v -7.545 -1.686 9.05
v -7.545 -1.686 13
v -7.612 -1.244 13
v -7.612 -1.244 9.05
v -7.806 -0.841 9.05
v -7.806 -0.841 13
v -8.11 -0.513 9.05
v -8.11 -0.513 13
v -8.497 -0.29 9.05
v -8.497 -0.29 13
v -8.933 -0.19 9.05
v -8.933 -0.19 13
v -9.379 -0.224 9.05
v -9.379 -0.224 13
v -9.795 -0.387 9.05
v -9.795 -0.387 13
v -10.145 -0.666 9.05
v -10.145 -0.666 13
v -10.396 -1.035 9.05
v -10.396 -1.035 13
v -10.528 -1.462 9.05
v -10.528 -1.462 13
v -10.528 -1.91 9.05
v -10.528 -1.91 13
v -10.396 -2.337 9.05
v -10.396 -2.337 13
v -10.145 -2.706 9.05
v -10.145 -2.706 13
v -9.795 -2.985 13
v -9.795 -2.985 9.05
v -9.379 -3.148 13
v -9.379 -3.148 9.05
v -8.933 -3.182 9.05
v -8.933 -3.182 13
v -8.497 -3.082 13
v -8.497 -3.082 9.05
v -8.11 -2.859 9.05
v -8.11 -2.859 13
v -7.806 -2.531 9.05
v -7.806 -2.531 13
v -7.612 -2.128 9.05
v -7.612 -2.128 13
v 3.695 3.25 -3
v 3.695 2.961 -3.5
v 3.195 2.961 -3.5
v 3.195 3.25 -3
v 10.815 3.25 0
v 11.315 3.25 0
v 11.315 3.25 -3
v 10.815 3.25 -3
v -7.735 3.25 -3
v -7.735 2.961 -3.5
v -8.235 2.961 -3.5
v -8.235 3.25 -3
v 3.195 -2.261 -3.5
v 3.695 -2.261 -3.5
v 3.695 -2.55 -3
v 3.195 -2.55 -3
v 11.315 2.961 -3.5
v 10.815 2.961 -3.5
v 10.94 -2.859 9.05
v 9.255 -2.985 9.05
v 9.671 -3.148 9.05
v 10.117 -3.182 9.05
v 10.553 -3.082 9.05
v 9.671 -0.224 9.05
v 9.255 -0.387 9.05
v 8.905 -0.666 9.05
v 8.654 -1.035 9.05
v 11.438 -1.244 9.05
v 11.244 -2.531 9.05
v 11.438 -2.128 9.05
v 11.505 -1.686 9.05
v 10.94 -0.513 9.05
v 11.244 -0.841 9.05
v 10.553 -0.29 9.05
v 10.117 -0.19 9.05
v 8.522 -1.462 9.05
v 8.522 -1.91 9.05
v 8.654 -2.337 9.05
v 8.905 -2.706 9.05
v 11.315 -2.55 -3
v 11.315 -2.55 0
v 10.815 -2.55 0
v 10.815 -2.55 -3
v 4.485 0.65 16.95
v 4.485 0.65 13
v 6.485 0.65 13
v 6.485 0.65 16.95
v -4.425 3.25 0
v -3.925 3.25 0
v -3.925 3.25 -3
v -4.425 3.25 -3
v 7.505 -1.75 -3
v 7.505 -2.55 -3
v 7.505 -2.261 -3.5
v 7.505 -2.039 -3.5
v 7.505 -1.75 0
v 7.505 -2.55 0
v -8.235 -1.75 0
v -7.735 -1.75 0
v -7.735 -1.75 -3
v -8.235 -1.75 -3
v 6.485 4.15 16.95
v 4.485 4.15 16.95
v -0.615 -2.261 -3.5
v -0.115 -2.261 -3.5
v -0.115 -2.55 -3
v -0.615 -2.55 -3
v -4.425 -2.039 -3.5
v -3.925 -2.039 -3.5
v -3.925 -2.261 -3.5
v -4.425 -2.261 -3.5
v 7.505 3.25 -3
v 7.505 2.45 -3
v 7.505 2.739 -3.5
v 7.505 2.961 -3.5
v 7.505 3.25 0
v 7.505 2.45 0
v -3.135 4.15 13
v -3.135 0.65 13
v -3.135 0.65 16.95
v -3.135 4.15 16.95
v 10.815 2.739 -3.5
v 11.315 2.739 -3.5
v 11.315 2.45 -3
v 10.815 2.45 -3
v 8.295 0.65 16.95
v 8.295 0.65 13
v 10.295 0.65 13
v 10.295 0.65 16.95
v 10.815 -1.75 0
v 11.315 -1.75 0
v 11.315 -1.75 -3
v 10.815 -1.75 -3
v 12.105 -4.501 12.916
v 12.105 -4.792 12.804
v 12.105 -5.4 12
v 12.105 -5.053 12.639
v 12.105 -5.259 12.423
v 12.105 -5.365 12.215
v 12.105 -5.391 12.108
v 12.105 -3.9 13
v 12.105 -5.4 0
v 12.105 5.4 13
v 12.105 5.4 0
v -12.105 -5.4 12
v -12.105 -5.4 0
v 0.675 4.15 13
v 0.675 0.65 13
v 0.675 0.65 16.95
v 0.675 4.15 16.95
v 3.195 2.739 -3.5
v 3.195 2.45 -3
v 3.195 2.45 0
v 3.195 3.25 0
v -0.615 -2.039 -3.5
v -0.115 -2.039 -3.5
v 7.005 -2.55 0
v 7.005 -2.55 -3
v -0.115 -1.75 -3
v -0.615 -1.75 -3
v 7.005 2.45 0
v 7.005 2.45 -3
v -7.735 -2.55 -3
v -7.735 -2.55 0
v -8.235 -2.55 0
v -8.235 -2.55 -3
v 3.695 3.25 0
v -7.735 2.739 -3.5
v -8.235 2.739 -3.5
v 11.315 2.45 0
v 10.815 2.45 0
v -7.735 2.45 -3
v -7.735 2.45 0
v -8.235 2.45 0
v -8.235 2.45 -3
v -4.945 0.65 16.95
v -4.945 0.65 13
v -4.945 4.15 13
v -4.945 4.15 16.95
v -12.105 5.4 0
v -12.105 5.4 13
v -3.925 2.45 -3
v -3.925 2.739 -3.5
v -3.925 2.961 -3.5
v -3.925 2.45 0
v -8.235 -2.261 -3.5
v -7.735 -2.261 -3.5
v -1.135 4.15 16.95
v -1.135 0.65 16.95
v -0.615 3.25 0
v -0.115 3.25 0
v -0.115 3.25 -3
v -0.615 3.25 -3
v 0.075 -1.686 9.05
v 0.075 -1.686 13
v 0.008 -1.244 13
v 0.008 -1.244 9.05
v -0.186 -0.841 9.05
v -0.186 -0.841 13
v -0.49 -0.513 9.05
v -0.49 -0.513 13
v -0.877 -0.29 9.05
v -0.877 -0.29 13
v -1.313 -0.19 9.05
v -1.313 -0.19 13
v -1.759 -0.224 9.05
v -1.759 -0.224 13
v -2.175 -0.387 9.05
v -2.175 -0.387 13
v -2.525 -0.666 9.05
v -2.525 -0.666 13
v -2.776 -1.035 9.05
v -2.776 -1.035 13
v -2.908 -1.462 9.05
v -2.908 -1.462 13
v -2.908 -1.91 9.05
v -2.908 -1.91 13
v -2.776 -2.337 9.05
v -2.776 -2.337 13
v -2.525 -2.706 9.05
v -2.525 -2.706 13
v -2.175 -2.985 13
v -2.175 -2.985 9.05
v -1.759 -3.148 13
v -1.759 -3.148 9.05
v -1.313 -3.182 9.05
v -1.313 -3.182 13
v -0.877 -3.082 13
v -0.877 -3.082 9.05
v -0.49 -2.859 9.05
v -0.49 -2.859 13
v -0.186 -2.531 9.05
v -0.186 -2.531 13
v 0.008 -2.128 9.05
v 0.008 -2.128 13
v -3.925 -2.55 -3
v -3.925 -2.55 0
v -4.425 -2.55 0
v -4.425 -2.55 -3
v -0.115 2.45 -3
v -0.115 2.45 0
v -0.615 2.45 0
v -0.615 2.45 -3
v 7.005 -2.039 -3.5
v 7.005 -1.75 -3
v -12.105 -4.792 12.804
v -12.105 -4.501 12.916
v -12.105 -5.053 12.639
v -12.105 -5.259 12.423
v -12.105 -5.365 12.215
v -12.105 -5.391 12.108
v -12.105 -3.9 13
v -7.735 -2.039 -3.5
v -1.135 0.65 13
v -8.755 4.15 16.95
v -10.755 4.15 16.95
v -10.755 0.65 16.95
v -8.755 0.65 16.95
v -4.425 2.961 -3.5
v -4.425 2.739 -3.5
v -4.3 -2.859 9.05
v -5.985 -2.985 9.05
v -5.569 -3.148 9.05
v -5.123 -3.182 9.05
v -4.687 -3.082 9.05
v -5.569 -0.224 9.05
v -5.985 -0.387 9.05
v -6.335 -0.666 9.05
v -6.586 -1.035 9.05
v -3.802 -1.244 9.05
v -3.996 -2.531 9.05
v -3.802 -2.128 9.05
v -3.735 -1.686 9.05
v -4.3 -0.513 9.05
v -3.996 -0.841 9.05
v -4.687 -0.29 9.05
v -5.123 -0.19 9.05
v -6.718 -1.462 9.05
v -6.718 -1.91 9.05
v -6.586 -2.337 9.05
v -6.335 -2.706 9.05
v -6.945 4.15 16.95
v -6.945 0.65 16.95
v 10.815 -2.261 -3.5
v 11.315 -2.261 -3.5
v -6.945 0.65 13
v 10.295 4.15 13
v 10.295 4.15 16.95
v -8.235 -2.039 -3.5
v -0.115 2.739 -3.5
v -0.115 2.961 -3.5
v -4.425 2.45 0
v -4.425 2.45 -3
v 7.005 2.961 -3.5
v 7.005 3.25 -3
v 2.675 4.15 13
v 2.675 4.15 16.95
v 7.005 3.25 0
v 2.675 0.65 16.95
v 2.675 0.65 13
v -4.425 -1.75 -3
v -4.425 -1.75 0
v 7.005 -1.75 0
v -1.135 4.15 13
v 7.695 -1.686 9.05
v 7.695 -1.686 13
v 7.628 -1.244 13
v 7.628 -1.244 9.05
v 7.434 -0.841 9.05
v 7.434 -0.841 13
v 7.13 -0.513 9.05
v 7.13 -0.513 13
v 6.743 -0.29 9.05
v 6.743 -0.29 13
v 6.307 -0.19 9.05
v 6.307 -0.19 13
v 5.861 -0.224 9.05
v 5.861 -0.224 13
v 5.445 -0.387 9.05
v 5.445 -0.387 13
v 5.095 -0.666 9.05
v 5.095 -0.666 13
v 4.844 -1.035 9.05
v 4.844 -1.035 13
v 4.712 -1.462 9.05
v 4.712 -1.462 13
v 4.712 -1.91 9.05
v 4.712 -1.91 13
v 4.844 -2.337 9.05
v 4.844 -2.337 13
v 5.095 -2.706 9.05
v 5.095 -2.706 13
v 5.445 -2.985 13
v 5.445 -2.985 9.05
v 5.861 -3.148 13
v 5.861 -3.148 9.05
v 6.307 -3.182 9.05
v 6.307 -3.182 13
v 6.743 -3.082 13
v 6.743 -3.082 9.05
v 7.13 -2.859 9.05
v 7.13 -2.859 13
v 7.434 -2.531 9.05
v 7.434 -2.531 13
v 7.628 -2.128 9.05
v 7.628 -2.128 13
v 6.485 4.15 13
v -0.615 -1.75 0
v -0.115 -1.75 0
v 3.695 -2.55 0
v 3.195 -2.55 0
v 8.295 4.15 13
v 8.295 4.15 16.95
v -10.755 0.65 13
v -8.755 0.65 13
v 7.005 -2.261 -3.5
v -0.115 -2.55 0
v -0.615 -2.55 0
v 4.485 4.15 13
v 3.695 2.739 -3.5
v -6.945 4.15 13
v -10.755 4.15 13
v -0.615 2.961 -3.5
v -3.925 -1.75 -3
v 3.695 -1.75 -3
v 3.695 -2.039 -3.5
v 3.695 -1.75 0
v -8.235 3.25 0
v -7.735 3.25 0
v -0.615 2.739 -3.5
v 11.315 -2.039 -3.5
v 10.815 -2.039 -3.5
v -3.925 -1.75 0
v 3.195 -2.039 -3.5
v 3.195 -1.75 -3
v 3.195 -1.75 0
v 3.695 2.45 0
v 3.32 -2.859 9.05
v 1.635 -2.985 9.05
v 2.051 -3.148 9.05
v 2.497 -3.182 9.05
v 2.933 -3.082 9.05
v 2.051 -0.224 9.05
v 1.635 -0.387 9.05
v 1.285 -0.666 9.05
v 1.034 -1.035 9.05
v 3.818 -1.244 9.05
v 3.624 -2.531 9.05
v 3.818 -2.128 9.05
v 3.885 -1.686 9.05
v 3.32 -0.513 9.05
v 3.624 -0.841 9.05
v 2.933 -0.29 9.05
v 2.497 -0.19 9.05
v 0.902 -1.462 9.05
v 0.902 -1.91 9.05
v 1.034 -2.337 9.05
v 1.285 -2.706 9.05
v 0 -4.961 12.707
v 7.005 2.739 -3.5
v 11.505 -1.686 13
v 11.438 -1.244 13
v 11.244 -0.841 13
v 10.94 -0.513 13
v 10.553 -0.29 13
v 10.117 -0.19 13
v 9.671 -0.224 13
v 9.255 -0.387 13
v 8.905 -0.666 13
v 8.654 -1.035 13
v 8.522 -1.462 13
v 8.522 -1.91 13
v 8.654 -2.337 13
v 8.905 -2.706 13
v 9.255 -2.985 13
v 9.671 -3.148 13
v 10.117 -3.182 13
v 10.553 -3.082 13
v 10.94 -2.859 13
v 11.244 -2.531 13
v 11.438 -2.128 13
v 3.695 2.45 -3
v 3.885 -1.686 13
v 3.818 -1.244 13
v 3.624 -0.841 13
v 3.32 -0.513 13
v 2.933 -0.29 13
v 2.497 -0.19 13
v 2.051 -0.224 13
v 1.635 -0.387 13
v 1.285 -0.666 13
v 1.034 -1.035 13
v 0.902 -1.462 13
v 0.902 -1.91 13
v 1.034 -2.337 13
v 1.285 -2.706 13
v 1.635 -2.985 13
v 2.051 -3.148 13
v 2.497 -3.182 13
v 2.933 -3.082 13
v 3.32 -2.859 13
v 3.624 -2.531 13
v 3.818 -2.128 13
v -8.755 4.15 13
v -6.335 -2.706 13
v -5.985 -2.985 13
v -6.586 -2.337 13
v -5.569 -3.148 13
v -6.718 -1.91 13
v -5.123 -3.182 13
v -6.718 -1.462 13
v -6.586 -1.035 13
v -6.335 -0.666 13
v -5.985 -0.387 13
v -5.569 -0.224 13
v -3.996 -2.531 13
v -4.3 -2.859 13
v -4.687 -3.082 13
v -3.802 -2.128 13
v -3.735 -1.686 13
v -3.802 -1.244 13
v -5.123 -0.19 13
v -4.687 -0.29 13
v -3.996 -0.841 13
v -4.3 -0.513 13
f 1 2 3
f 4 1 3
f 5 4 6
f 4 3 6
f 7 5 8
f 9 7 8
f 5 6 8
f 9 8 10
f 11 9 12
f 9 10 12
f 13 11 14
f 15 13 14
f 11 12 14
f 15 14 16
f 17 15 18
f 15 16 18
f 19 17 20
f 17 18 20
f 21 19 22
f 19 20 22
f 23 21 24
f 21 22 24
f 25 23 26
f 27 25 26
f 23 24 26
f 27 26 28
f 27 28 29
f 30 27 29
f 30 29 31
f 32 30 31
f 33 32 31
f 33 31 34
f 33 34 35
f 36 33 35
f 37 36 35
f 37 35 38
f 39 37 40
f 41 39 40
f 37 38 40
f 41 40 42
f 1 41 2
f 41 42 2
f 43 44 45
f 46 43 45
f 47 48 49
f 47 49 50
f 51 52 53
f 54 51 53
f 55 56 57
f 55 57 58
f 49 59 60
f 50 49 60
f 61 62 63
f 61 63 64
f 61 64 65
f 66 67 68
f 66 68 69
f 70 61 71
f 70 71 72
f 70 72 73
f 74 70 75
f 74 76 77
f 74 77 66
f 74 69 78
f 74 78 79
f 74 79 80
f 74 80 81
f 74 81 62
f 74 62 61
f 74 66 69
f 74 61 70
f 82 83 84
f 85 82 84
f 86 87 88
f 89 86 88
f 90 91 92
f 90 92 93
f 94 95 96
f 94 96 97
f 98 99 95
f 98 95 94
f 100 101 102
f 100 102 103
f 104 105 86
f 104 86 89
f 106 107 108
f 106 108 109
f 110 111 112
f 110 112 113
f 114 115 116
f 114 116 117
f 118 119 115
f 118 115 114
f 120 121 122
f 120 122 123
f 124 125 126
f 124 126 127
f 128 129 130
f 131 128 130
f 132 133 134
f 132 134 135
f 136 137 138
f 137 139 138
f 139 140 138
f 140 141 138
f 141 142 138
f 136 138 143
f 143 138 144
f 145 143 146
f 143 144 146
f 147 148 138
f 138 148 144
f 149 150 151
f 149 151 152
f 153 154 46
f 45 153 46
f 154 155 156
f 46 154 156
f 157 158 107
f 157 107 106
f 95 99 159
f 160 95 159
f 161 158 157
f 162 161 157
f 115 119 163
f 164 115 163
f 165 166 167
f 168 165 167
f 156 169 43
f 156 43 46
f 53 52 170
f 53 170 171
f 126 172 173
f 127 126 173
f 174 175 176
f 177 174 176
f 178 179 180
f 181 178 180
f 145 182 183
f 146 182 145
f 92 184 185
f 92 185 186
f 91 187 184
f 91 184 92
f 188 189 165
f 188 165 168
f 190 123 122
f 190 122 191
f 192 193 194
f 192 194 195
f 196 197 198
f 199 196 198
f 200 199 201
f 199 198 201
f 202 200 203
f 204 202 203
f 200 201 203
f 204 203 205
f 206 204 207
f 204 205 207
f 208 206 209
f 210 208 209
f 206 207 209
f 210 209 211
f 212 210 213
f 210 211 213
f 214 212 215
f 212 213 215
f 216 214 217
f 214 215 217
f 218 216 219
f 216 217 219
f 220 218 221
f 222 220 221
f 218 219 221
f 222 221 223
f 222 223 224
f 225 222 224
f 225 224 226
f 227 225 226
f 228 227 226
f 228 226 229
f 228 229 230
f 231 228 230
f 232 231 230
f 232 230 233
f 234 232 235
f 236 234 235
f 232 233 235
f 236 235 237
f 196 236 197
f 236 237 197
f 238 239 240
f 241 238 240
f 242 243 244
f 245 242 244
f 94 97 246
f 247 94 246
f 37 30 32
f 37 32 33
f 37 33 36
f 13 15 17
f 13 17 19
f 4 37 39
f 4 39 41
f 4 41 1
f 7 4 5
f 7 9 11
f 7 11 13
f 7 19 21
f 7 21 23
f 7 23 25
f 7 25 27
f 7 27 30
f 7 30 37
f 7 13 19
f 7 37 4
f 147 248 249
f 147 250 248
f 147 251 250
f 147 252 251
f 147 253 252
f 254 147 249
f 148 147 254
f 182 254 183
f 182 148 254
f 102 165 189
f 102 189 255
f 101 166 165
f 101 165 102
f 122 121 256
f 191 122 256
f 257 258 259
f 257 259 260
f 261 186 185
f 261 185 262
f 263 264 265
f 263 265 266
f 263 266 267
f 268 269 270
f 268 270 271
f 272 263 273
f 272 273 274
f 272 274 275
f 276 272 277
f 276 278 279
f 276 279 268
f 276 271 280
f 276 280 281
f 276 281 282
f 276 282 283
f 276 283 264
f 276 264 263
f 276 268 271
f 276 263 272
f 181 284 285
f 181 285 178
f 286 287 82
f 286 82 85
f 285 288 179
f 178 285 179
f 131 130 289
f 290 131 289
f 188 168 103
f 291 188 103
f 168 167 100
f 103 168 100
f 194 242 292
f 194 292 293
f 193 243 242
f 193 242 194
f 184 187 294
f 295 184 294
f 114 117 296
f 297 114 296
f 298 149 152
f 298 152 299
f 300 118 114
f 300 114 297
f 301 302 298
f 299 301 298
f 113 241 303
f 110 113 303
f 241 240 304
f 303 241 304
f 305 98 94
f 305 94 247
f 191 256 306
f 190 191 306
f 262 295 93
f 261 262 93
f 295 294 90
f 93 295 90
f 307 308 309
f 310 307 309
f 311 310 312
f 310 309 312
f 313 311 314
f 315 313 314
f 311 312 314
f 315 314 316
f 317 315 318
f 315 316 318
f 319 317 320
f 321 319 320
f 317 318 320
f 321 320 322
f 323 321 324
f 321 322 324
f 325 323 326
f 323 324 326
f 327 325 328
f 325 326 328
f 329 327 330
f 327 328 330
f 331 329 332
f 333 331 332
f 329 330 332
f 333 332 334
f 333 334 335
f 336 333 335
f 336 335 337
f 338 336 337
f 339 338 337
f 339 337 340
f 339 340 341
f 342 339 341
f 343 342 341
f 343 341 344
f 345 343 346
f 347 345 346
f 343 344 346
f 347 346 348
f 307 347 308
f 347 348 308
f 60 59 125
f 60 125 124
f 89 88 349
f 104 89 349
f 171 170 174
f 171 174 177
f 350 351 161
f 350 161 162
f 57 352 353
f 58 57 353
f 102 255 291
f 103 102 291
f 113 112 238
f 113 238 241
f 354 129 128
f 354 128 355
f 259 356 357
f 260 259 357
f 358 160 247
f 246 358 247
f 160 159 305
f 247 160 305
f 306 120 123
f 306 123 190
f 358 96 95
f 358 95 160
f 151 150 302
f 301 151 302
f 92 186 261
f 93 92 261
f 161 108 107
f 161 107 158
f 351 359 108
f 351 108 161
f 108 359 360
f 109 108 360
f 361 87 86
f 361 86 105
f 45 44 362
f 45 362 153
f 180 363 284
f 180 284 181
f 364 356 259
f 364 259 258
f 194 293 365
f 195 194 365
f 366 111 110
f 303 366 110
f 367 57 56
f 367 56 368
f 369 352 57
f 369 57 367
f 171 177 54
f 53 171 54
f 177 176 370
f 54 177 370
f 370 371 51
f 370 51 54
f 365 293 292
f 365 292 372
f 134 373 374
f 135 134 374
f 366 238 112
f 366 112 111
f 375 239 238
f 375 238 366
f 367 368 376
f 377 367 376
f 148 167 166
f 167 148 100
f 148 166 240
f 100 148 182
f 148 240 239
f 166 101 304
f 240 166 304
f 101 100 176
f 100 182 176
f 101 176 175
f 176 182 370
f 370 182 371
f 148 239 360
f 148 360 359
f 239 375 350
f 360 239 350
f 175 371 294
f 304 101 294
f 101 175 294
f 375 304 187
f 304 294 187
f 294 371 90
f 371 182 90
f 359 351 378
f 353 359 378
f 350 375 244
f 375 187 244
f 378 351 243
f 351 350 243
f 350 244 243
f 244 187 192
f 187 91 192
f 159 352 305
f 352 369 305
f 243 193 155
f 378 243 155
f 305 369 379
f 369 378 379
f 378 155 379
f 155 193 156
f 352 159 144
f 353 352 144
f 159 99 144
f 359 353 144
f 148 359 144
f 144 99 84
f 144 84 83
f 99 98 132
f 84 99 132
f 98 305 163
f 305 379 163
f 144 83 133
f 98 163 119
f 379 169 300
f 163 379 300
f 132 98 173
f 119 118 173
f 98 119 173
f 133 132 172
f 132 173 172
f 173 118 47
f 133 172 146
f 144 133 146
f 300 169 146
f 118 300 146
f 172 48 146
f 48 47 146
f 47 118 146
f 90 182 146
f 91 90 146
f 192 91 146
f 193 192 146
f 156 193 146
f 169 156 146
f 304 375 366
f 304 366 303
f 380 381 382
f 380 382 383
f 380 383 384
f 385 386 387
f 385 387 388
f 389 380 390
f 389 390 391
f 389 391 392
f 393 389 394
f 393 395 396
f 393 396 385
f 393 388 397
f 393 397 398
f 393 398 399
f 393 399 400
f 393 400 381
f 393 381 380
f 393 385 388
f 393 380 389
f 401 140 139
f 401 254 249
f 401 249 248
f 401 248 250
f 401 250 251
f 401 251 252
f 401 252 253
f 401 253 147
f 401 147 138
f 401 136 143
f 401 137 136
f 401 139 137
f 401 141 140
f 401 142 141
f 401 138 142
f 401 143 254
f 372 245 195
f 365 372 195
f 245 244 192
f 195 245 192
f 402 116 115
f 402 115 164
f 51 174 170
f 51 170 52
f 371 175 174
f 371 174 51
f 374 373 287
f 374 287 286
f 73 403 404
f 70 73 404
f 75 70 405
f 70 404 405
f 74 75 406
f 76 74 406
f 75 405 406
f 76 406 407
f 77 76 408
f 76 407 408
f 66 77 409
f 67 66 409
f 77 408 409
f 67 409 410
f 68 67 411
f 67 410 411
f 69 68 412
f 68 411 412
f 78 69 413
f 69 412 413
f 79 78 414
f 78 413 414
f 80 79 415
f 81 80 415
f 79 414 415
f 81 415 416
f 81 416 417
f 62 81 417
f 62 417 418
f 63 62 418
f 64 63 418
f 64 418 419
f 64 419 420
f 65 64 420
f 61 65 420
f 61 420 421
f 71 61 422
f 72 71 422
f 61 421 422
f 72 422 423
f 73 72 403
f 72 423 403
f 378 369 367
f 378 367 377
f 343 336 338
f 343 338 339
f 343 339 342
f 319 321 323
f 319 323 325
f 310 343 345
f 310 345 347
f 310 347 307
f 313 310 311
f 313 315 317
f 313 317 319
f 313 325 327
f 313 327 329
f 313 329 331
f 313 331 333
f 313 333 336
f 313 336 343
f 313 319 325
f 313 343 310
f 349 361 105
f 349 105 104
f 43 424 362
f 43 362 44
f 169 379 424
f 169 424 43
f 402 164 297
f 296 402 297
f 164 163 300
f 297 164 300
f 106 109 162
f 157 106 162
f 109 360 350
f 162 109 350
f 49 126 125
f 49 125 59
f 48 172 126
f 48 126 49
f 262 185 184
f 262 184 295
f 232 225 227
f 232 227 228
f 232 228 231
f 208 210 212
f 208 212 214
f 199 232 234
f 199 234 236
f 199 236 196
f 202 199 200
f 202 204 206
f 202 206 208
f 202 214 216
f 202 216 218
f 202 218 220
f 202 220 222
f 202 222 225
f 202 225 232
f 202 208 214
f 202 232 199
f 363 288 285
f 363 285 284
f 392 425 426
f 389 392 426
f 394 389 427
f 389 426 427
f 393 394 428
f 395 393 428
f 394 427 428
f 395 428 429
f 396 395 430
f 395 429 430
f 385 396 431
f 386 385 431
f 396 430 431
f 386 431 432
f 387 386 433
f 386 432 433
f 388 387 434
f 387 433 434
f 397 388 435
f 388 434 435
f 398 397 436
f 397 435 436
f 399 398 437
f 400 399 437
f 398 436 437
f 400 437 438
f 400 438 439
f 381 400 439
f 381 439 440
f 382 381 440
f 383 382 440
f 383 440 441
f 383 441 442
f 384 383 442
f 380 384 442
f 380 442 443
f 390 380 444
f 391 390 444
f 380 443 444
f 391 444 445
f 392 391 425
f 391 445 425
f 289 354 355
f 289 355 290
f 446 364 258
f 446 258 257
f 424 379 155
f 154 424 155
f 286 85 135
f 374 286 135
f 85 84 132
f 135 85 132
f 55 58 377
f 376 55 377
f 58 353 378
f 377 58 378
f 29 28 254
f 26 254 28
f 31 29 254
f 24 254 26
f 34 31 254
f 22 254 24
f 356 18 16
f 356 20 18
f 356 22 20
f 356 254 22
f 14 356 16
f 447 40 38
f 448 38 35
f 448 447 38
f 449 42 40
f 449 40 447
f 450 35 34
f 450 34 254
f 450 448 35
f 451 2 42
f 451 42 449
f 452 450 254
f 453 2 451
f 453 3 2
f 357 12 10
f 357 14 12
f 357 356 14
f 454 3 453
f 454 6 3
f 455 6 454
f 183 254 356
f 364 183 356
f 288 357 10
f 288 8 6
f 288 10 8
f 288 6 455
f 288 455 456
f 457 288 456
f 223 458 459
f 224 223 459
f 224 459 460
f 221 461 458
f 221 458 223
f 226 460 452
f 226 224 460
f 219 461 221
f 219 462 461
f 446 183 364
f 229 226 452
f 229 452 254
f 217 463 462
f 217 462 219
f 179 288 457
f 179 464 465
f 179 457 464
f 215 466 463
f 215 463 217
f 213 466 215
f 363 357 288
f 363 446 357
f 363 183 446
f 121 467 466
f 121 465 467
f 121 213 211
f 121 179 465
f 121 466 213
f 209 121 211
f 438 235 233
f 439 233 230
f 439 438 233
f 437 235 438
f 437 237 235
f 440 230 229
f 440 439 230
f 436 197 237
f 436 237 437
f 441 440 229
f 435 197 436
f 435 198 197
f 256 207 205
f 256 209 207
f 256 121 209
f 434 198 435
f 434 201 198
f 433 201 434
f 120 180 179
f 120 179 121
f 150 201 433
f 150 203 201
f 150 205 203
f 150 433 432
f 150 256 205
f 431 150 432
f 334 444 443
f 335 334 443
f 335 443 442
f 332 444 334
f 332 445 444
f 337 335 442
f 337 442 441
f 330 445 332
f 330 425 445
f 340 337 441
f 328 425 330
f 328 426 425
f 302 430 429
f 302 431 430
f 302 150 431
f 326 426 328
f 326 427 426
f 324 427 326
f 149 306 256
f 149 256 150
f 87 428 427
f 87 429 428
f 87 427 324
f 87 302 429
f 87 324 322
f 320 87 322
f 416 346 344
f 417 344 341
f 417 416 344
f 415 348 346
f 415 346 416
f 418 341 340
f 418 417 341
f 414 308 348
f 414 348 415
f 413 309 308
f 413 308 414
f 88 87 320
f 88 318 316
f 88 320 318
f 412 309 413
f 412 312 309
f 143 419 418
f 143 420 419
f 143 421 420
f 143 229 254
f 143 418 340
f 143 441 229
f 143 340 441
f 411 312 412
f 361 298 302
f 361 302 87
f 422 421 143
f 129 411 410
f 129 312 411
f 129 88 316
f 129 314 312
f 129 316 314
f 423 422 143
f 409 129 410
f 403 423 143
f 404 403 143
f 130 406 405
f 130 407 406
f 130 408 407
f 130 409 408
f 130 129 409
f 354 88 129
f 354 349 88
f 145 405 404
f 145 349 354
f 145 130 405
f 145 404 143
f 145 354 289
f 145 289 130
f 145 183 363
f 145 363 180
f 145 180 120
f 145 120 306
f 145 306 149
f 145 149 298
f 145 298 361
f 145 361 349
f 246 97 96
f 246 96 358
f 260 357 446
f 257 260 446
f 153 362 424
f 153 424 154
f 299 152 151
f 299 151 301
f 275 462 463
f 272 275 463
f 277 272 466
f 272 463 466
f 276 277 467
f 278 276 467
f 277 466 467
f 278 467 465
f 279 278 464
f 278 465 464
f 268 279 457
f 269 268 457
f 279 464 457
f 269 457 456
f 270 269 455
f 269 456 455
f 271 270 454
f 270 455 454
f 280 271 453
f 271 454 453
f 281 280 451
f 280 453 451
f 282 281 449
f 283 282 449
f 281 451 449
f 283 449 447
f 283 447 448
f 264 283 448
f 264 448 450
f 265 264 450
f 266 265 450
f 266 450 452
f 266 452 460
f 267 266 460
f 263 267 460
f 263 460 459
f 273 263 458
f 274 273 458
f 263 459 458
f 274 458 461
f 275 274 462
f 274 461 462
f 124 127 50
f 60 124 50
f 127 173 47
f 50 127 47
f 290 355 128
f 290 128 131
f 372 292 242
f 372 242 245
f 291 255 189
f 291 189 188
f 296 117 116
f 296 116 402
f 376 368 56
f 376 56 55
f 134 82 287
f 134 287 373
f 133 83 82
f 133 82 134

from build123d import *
from OCP.BRepFilletAPI import BRepFilletAPI_MakeChamfer

# Parameters (mm, degrees)
SKETCH_1_W                          = 24.21
SKETCH_1_H                          = 10.8
EXTRUDE_1_DEPTH                     = 13
FILLET_1_SIZE                       = 1
FILLET_1_SIZE_2                     = 1.5
SKETCH_2_W                          = 2
SKETCH_2_H                          = 3.5
EXTRUDE_2_DEPTH                     = 3.95
SKETCH_3_R                          = 1.5
CUT_EXTRUDE_1_DEPTH                 = 3.95
SKETCH_4_W                          = 0.5
SKETCH_4_H                          = 0.8
EXTRUDE_3_DEPTH                     = 3.5
CHAMFER_1_SIZE                      = 0.5
CHAMFER_1_SIZE2                     = 0.288675135
PATTERN_LINEAR_2_COUNT              = 6
PATTERN_LINEAR_2_PITCH              = 3.81
CHAMFER_1_OF_PATTERN_LINEAR_2_SIZE  = 0.5
CHAMFER_1_OF_PATTERN_LINEAR_2_SIZE2 = 0.288675135


with BuildPart() as part:
    # Эскиз1 → Бобышка-Вытянуть1 (new body)
    with BuildSketch(Plane.XY):
        Rectangle(SKETCH_1_W, SKETCH_1_H)
    extrude(amount=EXTRUDE_1_DEPTH)

    # Скругление1
    # an asymmetric fillet: 1.5, 1 mm, written as the material it takes off along each edge
    with BuildSketch(Plane(origin=(-15.855, -5.4, 13), x_dir=(0, 0, -1), z_dir=(1, 0, 0))) as fillet_1_piece_1:
        with BuildLine():
            Bezier((FILLET_1_SIZE, 0), (0, 0), (0, FILLET_1_SIZE_2), weights=[1, 0.707106781, 1])
            Line((0, FILLET_1_SIZE_2), (0, 0))
            Line((0, 0), (FILLET_1_SIZE, 0))
        make_face()
    extrude(amount=31.71, mode=Mode.SUBTRACT)

    # Эскиз2 → Бобышка-Вытянуть2 (add)
    with BuildSketch(Plane.XY.offset(13)):
        with Locations((9.295, 2.4)):
            Rectangle(SKETCH_2_W, SKETCH_2_H)
    extrude_2 = extrude(amount=EXTRUDE_2_DEPTH)

    # Эскиз3 → Вырез-Вытянуть1 (cut)
    with BuildSketch(Plane.XY.offset(13)):
        with Locations((10.005, -1.686021073)):
            Circle(SKETCH_3_R)
    cut_extrude_1 = extrude(amount=-CUT_EXTRUDE_1_DEPTH, mode=Mode.SUBTRACT)

    # Эскиз4 → Бобышка-Вытянуть3 (add)
    with BuildSketch(Plane(origin=(0, 0, 0), x_dir=(-1, 0, 0), z_dir=(0, 0, -1))):
        with Locations((-11.065, 2.85)):
            Rectangle(SKETCH_4_W, SKETCH_4_H)
        with Locations((-11.065, -2.15)):
            Rectangle(SKETCH_4_W, SKETCH_4_H)
    extrude_3 = extrude(amount=EXTRUDE_3_DEPTH)

    # Фаска1: one chamfer whose edges measure the first distance from different faces: ONE call of the kernel's chamfer builder (chamfer() names one face for all edges)
    chamfer_1_edges_1 = [part.edges().sort_by_distance(p)[0] for p in [
        (11.065, 3.25, -3.5),
    ]]
    chamfer_1_side_1 = [part.faces().sort_by_distance(p)[0] for p in [
        (11.065, 3.25, -1.75),
    ]]
    chamfer_1_edges_2 = [part.edges().sort_by_distance(p)[0] for p in [
        (11.065, 2.45, -3.5),
    ]]
    chamfer_1_side_2 = [part.faces().sort_by_distance(p)[0] for p in [
        (11.065, 2.45, -1.75),
    ]]
    chamfer_1_edges_3 = [part.edges().sort_by_distance(p)[0] for p in [
        (11.065, -2.55, -3.5),
    ]]
    chamfer_1_side_3 = [part.faces().sort_by_distance(p)[0] for p in [
        (11.065, -2.55, -1.75),
    ]]
    chamfer_1_edges_4 = [part.edges().sort_by_distance(p)[0] for p in [
        (11.065, -1.75, -3.5),
    ]]
    chamfer_1_side_4 = [part.faces().sort_by_distance(p)[0] for p in [
        (11.065, -1.75, -1.75),
    ]]
    chamfer_1 = BRepFilletAPI_MakeChamfer(part.part.solid().wrapped)
    for e in chamfer_1_edges_1:
        chamfer_1.Add(CHAMFER_1_SIZE, CHAMFER_1_SIZE2, e.wrapped, chamfer_1_side_1[0].wrapped)  # the first distance lies on this face
    for e in chamfer_1_edges_2:
        chamfer_1.Add(CHAMFER_1_SIZE, CHAMFER_1_SIZE2, e.wrapped, chamfer_1_side_2[0].wrapped)  # the first distance lies on this face
    for e in chamfer_1_edges_3:
        chamfer_1.Add(CHAMFER_1_SIZE, CHAMFER_1_SIZE2, e.wrapped, chamfer_1_side_3[0].wrapped)  # the first distance lies on this face
    for e in chamfer_1_edges_4:
        chamfer_1.Add(CHAMFER_1_SIZE, CHAMFER_1_SIZE2, e.wrapped, chamfer_1_side_4[0].wrapped)  # the first distance lies on this face
    add(Compound.cast(chamfer_1.Shape()), mode=Mode.REPLACE)

    # Линейный массив2: Бобышка-Вытянуть2, Вырез-Вытянуть1, Бобышка-Вытянуть3 ×6
    with Locations(*[(-i * PATTERN_LINEAR_2_PITCH, 0, 0) for i in range(1, PATTERN_LINEAR_2_COUNT)]):
        add(extrude_2)
        add(cut_extrude_1, mode=Mode.SUBTRACT)
        add(extrude_3)

    # Фаска1 of Линейный массив2: one chamfer whose edges measure the first distance from different faces: ONE call of the kernel's chamfer builder (chamfer() names one face for all edges)
    chamfer_1_of_pattern_linear_2_edges_1 = [part.edges().sort_by_distance(p)[0] for p in [
        (7.255, 3.25, -3.5),
    ]]
    chamfer_1_of_pattern_linear_2_side_1 = [part.faces().sort_by_distance(p)[0] for p in [
        (7.255, 3.25, -1.75),
    ]]
    chamfer_1_of_pattern_linear_2_edges_2 = [part.edges().sort_by_distance(p)[0] for p in [
        (7.255, 2.45, -3.5),
    ]]
    chamfer_1_of_pattern_linear_2_side_2 = [part.faces().sort_by_distance(p)[0] for p in [
        (7.255, 2.45, -1.75),
    ]]
    chamfer_1_of_pattern_linear_2_edges_3 = [part.edges().sort_by_distance(p)[0] for p in [
        (7.255, -2.55, -3.5),
    ]]
    chamfer_1_of_pattern_linear_2_side_3 = [part.faces().sort_by_distance(p)[0] for p in [
        (7.255, -2.55, -1.75),
    ]]
    chamfer_1_of_pattern_linear_2_edges_4 = [part.edges().sort_by_distance(p)[0] for p in [
        (7.255, -1.75, -3.5),
    ]]
    chamfer_1_of_pattern_linear_2_side_4 = [part.faces().sort_by_distance(p)[0] for p in [
        (7.255, -1.75, -1.75),
    ]]
    chamfer_1_of_pattern_linear_2_edges_5 = [part.edges().sort_by_distance(p)[0] for p in [
        (3.445, 3.25, -3.5),
    ]]
    chamfer_1_of_pattern_linear_2_side_5 = [part.faces().sort_by_distance(p)[0] for p in [
        (3.445, 3.25, -1.75),
    ]]
    chamfer_1_of_pattern_linear_2_edges_6 = [part.edges().sort_by_distance(p)[0] for p in [
        (3.445, 2.45, -3.5),
    ]]
    chamfer_1_of_pattern_linear_2_side_6 = [part.faces().sort_by_distance(p)[0] for p in [
        (3.445, 2.45, -1.75),
    ]]
    chamfer_1_of_pattern_linear_2_edges_7 = [part.edges().sort_by_distance(p)[0] for p in [
        (3.445, -2.55, -3.5),
    ]]
    chamfer_1_of_pattern_linear_2_side_7 = [part.faces().sort_by_distance(p)[0] for p in [
        (3.445, -2.55, -1.75),
    ]]
    chamfer_1_of_pattern_linear_2_edges_8 = [part.edges().sort_by_distance(p)[0] for p in [
        (3.445, -1.75, -3.5),
    ]]
    chamfer_1_of_pattern_linear_2_side_8 = [part.faces().sort_by_distance(p)[0] for p in [
        (3.445, -1.75, -1.75),
    ]]
    chamfer_1_of_pattern_linear_2_edges_9 = [part.edges().sort_by_distance(p)[0] for p in [
        (-0.365, 3.25, -3.5),
    ]]
    chamfer_1_of_pattern_linear_2_side_9 = [part.faces().sort_by_distance(p)[0] for p in [
        (-0.365, 3.25, -1.75),
    ]]
    chamfer_1_of_pattern_linear_2_edges_10 = [part.edges().sort_by_distance(p)[0] for p in [
        (-0.365, 2.45, -3.5),
    ]]
    chamfer_1_of_pattern_linear_2_side_10 = [part.faces().sort_by_distance(p)[0] for p in [
        (-0.365, 2.45, -1.75),
    ]]
    chamfer_1_of_pattern_linear_2_edges_11 = [part.edges().sort_by_distance(p)[0] for p in [
        (-0.365, -2.55, -3.5),
    ]]
    chamfer_1_of_pattern_linear_2_side_11 = [part.faces().sort_by_distance(p)[0] for p in [
        (-0.365, -2.55, -1.75),
    ]]
    chamfer_1_of_pattern_linear_2_edges_12 = [part.edges().sort_by_distance(p)[0] for p in [
        (-0.365, -1.75, -3.5),
    ]]
    chamfer_1_of_pattern_linear_2_side_12 = [part.faces().sort_by_distance(p)[0] for p in [
        (-0.365, -1.75, -1.75),
    ]]
    chamfer_1_of_pattern_linear_2_edges_13 = [part.edges().sort_by_distance(p)[0] for p in [
        (-4.175, 3.25, -3.5),
    ]]
    chamfer_1_of_pattern_linear_2_side_13 = [part.faces().sort_by_distance(p)[0] for p in [
        (-4.175, 3.25, -1.75),
    ]]
    chamfer_1_of_pattern_linear_2_edges_14 = [part.edges().sort_by_distance(p)[0] for p in [
        (-4.175, 2.45, -3.5),
    ]]
    chamfer_1_of_pattern_linear_2_side_14 = [part.faces().sort_by_distance(p)[0] for p in [
        (-4.175, 2.45, -1.75),
    ]]
    chamfer_1_of_pattern_linear_2_edges_15 = [part.edges().sort_by_distance(p)[0] for p in [
        (-4.175, -2.55, -3.5),
    ]]
    chamfer_1_of_pattern_linear_2_side_15 = [part.faces().sort_by_distance(p)[0] for p in [
        (-4.175, -2.55, -1.75),
    ]]
    chamfer_1_of_pattern_linear_2_edges_16 = [part.edges().sort_by_distance(p)[0] for p in [
        (-4.175, -1.75, -3.5),
    ]]
    chamfer_1_of_pattern_linear_2_side_16 = [part.faces().sort_by_distance(p)[0] for p in [
        (-4.175, -1.75, -1.75),
    ]]
    chamfer_1_of_pattern_linear_2_edges_17 = [part.edges().sort_by_distance(p)[0] for p in [
        (-7.985, 3.25, -3.5),
    ]]
    chamfer_1_of_pattern_linear_2_side_17 = [part.faces().sort_by_distance(p)[0] for p in [
        (-7.985, 3.25, -1.75),
    ]]
    chamfer_1_of_pattern_linear_2_edges_18 = [part.edges().sort_by_distance(p)[0] for p in [
        (-7.985, 2.45, -3.5),
    ]]
    chamfer_1_of_pattern_linear_2_side_18 = [part.faces().sort_by_distance(p)[0] for p in [
        (-7.985, 2.45, -1.75),
    ]]
    chamfer_1_of_pattern_linear_2_edges_19 = [part.edges().sort_by_distance(p)[0] for p in [
        (-7.985, -2.55, -3.5),
    ]]
    chamfer_1_of_pattern_linear_2_side_19 = [part.faces().sort_by_distance(p)[0] for p in [
        (-7.985, -2.55, -1.75),
    ]]
    chamfer_1_of_pattern_linear_2_edges_20 = [part.edges().sort_by_distance(p)[0] for p in [
        (-7.985, -1.75, -3.5),
    ]]
    chamfer_1_of_pattern_linear_2_side_20 = [part.faces().sort_by_distance(p)[0] for p in [
        (-7.985, -1.75, -1.75),
    ]]
    chamfer_1_of_pattern_linear_2 = BRepFilletAPI_MakeChamfer(part.part.solid().wrapped)
    for e in chamfer_1_of_pattern_linear_2_edges_1:
        chamfer_1_of_pattern_linear_2.Add(CHAMFER_1_OF_PATTERN_LINEAR_2_SIZE, CHAMFER_1_OF_PATTERN_LINEAR_2_SIZE2, e.wrapped, chamfer_1_of_pattern_linear_2_side_1[0].wrapped)  # the first distance lies on this face
    for e in chamfer_1_of_pattern_linear_2_edges_2:
        chamfer_1_of_pattern_linear_2.Add(CHAMFER_1_OF_PATTERN_LINEAR_2_SIZE, CHAMFER_1_OF_PATTERN_LINEAR_2_SIZE2, e.wrapped, chamfer_1_of_pattern_linear_2_side_2[0].wrapped)  # the first distance lies on this face
    for e in chamfer_1_of_pattern_linear_2_edges_3:
        chamfer_1_of_pattern_linear_2.Add(CHAMFER_1_OF_PATTERN_LINEAR_2_SIZE, CHAMFER_1_OF_PATTERN_LINEAR_2_SIZE2, e.wrapped, chamfer_1_of_pattern_linear_2_side_3[0].wrapped)  # the first distance lies on this face
    for e in chamfer_1_of_pattern_linear_2_edges_4:
        chamfer_1_of_pattern_linear_2.Add(CHAMFER_1_OF_PATTERN_LINEAR_2_SIZE, CHAMFER_1_OF_PATTERN_LINEAR_2_SIZE2, e.wrapped, chamfer_1_of_pattern_linear_2_side_4[0].wrapped)  # the first distance lies on this face
    for e in chamfer_1_of_pattern_linear_2_edges_5:
        chamfer_1_of_pattern_linear_2.Add(CHAMFER_1_OF_PATTERN_LINEAR_2_SIZE, CHAMFER_1_OF_PATTERN_LINEAR_2_SIZE2, e.wrapped, chamfer_1_of_pattern_linear_2_side_5[0].wrapped)  # the first distance lies on this face
    for e in chamfer_1_of_pattern_linear_2_edges_6:
        chamfer_1_of_pattern_linear_2.Add(CHAMFER_1_OF_PATTERN_LINEAR_2_SIZE, CHAMFER_1_OF_PATTERN_LINEAR_2_SIZE2, e.wrapped, chamfer_1_of_pattern_linear_2_side_6[0].wrapped)  # the first distance lies on this face
    for e in chamfer_1_of_pattern_linear_2_edges_7:
        chamfer_1_of_pattern_linear_2.Add(CHAMFER_1_OF_PATTERN_LINEAR_2_SIZE, CHAMFER_1_OF_PATTERN_LINEAR_2_SIZE2, e.wrapped, chamfer_1_of_pattern_linear_2_side_7[0].wrapped)  # the first distance lies on this face
    for e in chamfer_1_of_pattern_linear_2_edges_8:
        chamfer_1_of_pattern_linear_2.Add(CHAMFER_1_OF_PATTERN_LINEAR_2_SIZE, CHAMFER_1_OF_PATTERN_LINEAR_2_SIZE2, e.wrapped, chamfer_1_of_pattern_linear_2_side_8[0].wrapped)  # the first distance lies on this face
    for e in chamfer_1_of_pattern_linear_2_edges_9:
        chamfer_1_of_pattern_linear_2.Add(CHAMFER_1_OF_PATTERN_LINEAR_2_SIZE, CHAMFER_1_OF_PATTERN_LINEAR_2_SIZE2, e.wrapped, chamfer_1_of_pattern_linear_2_side_9[0].wrapped)  # the first distance lies on this face
    for e in chamfer_1_of_pattern_linear_2_edges_10:
        chamfer_1_of_pattern_linear_2.Add(CHAMFER_1_OF_PATTERN_LINEAR_2_SIZE, CHAMFER_1_OF_PATTERN_LINEAR_2_SIZE2, e.wrapped, chamfer_1_of_pattern_linear_2_side_10[0].wrapped)  # the first distance lies on this face
    for e in chamfer_1_of_pattern_linear_2_edges_11:
        chamfer_1_of_pattern_linear_2.Add(CHAMFER_1_OF_PATTERN_LINEAR_2_SIZE, CHAMFER_1_OF_PATTERN_LINEAR_2_SIZE2, e.wrapped, chamfer_1_of_pattern_linear_2_side_11[0].wrapped)  # the first distance lies on this face
    for e in chamfer_1_of_pattern_linear_2_edges_12:
        chamfer_1_of_pattern_linear_2.Add(CHAMFER_1_OF_PATTERN_LINEAR_2_SIZE, CHAMFER_1_OF_PATTERN_LINEAR_2_SIZE2, e.wrapped, chamfer_1_of_pattern_linear_2_side_12[0].wrapped)  # the first distance lies on this face
    for e in chamfer_1_of_pattern_linear_2_edges_13:
        chamfer_1_of_pattern_linear_2.Add(CHAMFER_1_OF_PATTERN_LINEAR_2_SIZE, CHAMFER_1_OF_PATTERN_LINEAR_2_SIZE2, e.wrapped, chamfer_1_of_pattern_linear_2_side_13[0].wrapped)  # the first distance lies on this face
    for e in chamfer_1_of_pattern_linear_2_edges_14:
        chamfer_1_of_pattern_linear_2.Add(CHAMFER_1_OF_PATTERN_LINEAR_2_SIZE, CHAMFER_1_OF_PATTERN_LINEAR_2_SIZE2, e.wrapped, chamfer_1_of_pattern_linear_2_side_14[0].wrapped)  # the first distance lies on this face
    for e in chamfer_1_of_pattern_linear_2_edges_15:
        chamfer_1_of_pattern_linear_2.Add(CHAMFER_1_OF_PATTERN_LINEAR_2_SIZE, CHAMFER_1_OF_PATTERN_LINEAR_2_SIZE2, e.wrapped, chamfer_1_of_pattern_linear_2_side_15[0].wrapped)  # the first distance lies on this face
    for e in chamfer_1_of_pattern_linear_2_edges_16:
        chamfer_1_of_pattern_linear_2.Add(CHAMFER_1_OF_PATTERN_LINEAR_2_SIZE, CHAMFER_1_OF_PATTERN_LINEAR_2_SIZE2, e.wrapped, chamfer_1_of_pattern_linear_2_side_16[0].wrapped)  # the first distance lies on this face
    for e in chamfer_1_of_pattern_linear_2_edges_17:
        chamfer_1_of_pattern_linear_2.Add(CHAMFER_1_OF_PATTERN_LINEAR_2_SIZE, CHAMFER_1_OF_PATTERN_LINEAR_2_SIZE2, e.wrapped, chamfer_1_of_pattern_linear_2_side_17[0].wrapped)  # the first distance lies on this face
    for e in chamfer_1_of_pattern_linear_2_edges_18:
        chamfer_1_of_pattern_linear_2.Add(CHAMFER_1_OF_PATTERN_LINEAR_2_SIZE, CHAMFER_1_OF_PATTERN_LINEAR_2_SIZE2, e.wrapped, chamfer_1_of_pattern_linear_2_side_18[0].wrapped)  # the first distance lies on this face
    for e in chamfer_1_of_pattern_linear_2_edges_19:
        chamfer_1_of_pattern_linear_2.Add(CHAMFER_1_OF_PATTERN_LINEAR_2_SIZE, CHAMFER_1_OF_PATTERN_LINEAR_2_SIZE2, e.wrapped, chamfer_1_of_pattern_linear_2_side_19[0].wrapped)  # the first distance lies on this face
    for e in chamfer_1_of_pattern_linear_2_edges_20:
        chamfer_1_of_pattern_linear_2.Add(CHAMFER_1_OF_PATTERN_LINEAR_2_SIZE, CHAMFER_1_OF_PATTERN_LINEAR_2_SIZE2, e.wrapped, chamfer_1_of_pattern_linear_2_side_20[0].wrapped)  # the first distance lies on this face
    add(Compound.cast(chamfer_1_of_pattern_linear_2.Shape()), mode=Mode.REPLACE)


solid = part.part
